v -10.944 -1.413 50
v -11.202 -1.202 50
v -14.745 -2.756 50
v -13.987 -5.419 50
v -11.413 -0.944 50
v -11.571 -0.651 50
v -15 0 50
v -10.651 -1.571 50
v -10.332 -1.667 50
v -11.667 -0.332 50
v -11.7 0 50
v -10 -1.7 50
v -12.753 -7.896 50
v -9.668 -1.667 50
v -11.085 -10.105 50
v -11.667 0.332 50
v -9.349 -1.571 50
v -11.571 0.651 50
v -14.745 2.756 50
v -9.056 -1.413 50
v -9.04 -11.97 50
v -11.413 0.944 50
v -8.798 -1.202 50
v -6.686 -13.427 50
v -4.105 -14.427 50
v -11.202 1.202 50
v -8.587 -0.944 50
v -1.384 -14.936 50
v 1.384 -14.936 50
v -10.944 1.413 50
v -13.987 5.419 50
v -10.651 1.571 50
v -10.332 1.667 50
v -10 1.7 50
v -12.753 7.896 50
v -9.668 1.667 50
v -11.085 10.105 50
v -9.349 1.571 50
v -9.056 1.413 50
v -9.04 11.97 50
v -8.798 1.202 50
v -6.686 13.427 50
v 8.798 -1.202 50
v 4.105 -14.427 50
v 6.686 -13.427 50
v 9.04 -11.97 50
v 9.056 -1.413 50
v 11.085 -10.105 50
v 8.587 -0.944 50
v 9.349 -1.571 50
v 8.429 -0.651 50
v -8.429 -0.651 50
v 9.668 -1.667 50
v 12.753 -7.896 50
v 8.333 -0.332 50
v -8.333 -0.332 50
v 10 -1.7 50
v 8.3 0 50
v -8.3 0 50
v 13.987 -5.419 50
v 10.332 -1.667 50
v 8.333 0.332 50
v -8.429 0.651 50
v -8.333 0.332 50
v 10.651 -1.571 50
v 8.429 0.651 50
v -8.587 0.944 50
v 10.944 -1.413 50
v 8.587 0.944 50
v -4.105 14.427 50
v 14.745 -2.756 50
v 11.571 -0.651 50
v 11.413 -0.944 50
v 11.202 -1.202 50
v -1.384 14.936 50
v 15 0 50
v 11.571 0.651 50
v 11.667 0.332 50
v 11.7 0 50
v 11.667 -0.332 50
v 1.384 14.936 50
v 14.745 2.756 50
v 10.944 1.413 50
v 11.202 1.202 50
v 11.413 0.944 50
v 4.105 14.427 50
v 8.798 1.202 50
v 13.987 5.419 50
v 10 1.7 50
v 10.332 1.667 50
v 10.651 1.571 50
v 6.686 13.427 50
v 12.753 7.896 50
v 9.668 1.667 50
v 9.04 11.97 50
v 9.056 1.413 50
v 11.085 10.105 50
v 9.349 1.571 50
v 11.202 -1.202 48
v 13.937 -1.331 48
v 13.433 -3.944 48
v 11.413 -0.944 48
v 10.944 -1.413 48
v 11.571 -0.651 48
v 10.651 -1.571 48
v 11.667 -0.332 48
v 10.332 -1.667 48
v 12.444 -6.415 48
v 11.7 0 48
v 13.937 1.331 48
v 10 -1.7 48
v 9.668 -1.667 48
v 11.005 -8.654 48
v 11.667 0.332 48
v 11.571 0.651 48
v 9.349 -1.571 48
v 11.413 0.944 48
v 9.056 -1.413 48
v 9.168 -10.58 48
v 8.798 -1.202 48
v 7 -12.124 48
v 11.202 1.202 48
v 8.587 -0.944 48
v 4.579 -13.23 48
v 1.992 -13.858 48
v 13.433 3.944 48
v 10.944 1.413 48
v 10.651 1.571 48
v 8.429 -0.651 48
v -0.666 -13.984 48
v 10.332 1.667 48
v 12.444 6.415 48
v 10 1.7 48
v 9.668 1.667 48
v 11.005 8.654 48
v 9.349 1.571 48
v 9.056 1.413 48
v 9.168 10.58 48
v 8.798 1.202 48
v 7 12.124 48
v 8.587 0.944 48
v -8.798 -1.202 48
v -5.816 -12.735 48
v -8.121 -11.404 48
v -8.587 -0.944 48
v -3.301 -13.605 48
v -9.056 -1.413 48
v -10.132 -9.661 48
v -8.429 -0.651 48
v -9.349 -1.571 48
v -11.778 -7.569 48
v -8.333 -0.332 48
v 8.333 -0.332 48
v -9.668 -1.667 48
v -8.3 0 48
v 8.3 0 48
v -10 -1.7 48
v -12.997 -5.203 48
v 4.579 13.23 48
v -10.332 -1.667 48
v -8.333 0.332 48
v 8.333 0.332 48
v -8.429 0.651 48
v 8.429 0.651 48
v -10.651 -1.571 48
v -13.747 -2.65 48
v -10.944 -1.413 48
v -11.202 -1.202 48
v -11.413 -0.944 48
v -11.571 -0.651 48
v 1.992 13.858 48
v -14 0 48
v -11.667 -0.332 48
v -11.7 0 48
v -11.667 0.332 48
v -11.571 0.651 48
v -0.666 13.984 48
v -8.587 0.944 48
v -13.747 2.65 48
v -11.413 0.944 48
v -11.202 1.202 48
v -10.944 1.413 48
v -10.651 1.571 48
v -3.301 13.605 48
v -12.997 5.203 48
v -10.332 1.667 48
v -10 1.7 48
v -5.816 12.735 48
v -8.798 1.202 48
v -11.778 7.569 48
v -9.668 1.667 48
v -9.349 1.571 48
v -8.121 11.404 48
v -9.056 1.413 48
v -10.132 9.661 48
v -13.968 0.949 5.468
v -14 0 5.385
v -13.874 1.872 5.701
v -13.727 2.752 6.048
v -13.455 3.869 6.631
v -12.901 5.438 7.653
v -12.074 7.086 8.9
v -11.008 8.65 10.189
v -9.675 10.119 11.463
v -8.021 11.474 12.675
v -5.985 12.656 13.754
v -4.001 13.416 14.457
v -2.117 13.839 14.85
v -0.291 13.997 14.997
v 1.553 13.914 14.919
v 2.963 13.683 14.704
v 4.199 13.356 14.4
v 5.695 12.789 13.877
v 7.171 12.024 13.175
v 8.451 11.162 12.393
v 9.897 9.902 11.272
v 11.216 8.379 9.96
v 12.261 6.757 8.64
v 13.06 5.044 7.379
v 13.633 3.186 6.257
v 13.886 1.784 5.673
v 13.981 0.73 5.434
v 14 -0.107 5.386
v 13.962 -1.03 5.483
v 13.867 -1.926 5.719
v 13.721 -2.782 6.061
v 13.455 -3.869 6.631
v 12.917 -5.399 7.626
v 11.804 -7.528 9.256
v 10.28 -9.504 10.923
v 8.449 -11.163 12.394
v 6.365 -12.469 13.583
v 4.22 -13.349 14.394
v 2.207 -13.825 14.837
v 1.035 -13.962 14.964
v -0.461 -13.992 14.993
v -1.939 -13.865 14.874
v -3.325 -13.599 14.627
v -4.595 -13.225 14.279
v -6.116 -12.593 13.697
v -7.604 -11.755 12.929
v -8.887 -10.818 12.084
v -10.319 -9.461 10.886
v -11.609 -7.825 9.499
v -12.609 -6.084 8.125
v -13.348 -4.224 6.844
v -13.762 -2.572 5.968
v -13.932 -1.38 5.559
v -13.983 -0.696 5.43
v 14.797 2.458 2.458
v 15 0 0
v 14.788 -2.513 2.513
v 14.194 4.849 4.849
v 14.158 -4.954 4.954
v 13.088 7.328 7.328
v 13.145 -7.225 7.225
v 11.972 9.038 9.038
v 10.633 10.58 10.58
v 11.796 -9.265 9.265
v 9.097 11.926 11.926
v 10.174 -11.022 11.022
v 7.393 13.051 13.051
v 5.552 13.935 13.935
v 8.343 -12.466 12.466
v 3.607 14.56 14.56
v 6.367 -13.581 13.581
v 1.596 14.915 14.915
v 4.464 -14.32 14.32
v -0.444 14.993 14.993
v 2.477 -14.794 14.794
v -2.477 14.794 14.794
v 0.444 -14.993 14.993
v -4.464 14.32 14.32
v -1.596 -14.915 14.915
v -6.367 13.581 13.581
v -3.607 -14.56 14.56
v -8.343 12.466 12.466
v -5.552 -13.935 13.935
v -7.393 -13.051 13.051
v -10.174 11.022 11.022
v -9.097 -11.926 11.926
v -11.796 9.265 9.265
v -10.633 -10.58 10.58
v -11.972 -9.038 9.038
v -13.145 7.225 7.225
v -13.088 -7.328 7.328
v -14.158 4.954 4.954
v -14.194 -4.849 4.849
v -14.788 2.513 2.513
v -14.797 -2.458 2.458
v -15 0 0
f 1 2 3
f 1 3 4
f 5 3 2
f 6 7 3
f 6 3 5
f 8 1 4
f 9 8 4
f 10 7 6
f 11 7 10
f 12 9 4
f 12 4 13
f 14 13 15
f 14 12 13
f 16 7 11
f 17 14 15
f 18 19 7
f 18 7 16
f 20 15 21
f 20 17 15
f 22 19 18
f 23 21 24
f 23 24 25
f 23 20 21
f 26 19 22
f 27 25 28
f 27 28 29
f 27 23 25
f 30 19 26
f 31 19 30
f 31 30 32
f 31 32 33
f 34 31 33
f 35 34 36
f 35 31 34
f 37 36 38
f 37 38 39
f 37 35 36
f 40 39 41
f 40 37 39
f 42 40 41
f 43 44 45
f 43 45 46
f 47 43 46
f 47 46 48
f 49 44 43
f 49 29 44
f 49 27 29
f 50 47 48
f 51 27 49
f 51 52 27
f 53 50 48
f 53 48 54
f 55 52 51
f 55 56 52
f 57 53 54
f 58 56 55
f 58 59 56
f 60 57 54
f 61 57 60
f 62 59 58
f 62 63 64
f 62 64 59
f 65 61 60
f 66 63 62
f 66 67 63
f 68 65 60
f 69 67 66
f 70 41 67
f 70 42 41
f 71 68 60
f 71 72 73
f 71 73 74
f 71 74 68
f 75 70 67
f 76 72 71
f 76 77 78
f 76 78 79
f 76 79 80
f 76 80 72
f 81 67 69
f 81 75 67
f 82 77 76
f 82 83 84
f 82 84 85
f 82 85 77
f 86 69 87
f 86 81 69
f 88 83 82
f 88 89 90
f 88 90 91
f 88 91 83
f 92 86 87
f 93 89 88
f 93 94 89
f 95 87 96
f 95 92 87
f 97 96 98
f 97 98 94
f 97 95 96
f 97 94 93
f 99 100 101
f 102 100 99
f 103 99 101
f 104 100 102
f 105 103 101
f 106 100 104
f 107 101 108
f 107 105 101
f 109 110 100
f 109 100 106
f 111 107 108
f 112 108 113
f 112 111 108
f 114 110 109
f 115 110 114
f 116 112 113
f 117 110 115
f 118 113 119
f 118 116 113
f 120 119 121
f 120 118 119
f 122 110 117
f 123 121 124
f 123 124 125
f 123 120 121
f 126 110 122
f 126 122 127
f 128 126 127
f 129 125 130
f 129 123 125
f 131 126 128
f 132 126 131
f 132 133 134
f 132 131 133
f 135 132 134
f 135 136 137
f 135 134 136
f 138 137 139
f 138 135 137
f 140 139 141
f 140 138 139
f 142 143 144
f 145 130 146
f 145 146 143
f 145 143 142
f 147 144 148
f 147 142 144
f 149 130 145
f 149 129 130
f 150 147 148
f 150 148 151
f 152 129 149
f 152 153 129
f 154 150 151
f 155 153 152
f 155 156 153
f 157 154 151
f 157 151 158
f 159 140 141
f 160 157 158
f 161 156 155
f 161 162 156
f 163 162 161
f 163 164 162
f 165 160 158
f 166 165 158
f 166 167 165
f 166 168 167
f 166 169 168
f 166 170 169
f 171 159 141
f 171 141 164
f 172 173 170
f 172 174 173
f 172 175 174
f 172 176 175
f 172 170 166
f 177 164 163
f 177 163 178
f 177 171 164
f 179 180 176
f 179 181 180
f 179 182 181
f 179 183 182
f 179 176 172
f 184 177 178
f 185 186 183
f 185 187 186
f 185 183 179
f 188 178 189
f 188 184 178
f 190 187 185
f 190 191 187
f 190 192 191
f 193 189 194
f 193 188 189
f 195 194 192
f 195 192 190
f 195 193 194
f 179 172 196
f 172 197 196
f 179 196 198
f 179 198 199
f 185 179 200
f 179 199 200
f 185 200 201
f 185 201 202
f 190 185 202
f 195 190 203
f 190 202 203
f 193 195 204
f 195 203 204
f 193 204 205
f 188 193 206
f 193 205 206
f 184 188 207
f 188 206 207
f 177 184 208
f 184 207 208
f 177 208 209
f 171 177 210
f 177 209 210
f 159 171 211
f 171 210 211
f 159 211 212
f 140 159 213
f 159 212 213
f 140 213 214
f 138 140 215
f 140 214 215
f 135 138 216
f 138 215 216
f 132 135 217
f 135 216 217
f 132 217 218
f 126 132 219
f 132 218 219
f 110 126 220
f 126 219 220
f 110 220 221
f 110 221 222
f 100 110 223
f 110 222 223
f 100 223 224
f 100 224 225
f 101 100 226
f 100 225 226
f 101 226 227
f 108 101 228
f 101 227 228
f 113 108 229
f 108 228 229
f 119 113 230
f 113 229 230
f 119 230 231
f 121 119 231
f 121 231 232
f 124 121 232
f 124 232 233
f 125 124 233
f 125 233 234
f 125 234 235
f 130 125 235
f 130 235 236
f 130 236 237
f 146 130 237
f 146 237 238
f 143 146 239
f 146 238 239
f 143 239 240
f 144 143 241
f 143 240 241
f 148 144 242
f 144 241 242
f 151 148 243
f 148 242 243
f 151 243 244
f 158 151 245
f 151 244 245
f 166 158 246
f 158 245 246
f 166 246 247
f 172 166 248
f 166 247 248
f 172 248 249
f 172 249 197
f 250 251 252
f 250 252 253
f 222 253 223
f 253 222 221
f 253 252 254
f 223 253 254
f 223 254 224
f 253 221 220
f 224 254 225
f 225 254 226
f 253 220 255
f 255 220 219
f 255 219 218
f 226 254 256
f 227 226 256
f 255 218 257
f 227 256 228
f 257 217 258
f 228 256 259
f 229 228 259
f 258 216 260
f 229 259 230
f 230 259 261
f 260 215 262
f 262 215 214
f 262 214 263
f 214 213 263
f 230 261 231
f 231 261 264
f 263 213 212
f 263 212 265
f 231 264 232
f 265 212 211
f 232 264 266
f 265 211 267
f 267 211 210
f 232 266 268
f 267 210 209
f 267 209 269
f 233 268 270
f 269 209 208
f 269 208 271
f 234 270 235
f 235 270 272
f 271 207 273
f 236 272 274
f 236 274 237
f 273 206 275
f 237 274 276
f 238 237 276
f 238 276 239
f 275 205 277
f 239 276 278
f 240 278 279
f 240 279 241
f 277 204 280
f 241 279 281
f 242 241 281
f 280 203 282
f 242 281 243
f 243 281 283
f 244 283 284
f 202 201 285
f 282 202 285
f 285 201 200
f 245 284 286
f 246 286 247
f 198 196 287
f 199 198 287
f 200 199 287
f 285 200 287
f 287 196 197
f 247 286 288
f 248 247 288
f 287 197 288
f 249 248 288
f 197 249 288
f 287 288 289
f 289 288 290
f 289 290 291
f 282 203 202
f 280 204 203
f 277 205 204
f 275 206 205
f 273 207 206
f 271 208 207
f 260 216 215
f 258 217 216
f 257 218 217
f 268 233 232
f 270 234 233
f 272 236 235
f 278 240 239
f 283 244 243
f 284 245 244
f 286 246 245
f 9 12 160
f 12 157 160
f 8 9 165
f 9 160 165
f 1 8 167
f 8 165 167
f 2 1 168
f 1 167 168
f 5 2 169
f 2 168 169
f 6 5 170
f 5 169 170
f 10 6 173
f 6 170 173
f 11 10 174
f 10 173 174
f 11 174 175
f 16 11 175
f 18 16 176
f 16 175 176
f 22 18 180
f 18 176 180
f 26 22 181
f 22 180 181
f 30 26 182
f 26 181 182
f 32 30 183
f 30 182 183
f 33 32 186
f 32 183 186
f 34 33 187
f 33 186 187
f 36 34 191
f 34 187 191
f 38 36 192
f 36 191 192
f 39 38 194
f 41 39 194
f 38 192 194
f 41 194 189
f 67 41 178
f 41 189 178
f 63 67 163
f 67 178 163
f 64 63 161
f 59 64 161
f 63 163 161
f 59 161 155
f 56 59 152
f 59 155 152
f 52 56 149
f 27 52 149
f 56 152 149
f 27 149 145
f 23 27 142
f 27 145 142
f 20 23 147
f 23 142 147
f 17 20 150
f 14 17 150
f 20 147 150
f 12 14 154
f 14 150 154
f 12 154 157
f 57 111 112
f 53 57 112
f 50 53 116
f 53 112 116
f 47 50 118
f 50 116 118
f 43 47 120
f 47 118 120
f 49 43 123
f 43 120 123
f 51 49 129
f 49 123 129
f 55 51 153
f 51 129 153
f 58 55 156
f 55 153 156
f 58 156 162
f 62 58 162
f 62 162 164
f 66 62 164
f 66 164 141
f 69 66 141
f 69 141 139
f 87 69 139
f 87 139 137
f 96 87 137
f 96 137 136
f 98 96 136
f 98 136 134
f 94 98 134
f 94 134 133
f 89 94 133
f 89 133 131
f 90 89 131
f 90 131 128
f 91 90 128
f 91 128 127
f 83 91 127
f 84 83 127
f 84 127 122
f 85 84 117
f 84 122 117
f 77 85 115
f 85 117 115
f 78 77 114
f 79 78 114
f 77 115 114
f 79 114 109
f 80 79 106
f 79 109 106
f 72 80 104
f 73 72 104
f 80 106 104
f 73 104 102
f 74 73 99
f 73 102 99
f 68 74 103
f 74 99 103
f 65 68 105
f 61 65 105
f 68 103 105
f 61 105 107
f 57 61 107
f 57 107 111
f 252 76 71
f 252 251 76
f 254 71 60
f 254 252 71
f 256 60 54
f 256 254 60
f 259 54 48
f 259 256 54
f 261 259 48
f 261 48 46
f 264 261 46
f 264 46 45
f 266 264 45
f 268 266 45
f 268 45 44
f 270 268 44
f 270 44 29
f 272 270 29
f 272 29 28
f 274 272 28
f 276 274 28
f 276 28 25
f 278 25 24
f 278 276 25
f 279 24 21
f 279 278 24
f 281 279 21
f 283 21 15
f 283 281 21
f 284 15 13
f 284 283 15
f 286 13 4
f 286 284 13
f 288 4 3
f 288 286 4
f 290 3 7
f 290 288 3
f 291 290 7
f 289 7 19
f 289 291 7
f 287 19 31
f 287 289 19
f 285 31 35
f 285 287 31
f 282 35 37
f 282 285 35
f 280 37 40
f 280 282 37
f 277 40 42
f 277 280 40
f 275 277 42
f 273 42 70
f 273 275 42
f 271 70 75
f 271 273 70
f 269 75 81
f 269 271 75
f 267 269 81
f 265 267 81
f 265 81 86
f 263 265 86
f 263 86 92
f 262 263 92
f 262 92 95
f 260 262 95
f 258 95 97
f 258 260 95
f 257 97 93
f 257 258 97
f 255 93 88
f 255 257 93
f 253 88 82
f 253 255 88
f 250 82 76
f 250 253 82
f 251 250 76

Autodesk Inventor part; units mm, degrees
ref_plane "YZ Plane" through (0, 0, 0) normal (1, 0, 0) x (0, 1, 0)
ref_plane "XZ Plane" through (0, 0, 0) normal (0, 1, 0) x (-1, 0, 0)
ref_plane "XY Plane" through (0, 0, 0) normal (0, 0, 1) x (1, 0, 0)
sketch "スケッチ1" plane through (0, 0, 0) normal (0, 0, 1) x (1, 0, 0)
  circle A0 centre (0, 0) radius 15
  dimension "d0" = 30
extrude "押し出し1" add sketch "スケッチ1" along normal blind 30
sketch "スケッチ2" plane through (0, 0, 30) normal (0, 0, 1) x (1, 0, 0)
  circle A0 centre (0, 0) radius 15
  dimension "d3" = 30
extrude "押し出し2" add sketch "スケッチ2" along normal blind 20
sketch "スケッチ4" plane through (0, 0, 0) normal (1, 0, 0) x (0, 1, 0)
  point P0 (0, 0)
sketch "スケッチ5" plane through (0, 0, 0) normal (0, 0, -1) x (-1, 0, 0)
  circle A0 centre (0, 0) radius 14
  dimension "d6" = 28
extrude "押し出し3" cut sketch "スケッチ5" against normal blind 48
sketch "スケッチ6" plane through (0, 0, 0) normal (0, 1, 0) x (-1, 0, 0)
  line L0 (15, 0) -> (-15, 0) projected
  arc A0 (15, 0) -> (-15, 0) centre (0, 0) ccw
extrude "押し出し4" cut sketch "スケッチ6" along normal blind 50 and the other way blind 25
sketch "スケッチ7" plane through (0, 0, 50) normal (0, 0, 1) x (1, 0, 0)
  point P0 (0, 0)
  point P1 (10, 0)
  point P2 (-10, 0)
  dimension "d14" = 10
  dimension "d15" = 10
hole "穴1" at (10, 0, 50) at (-10, 0, 50) direction (0, 0, -1) diameter 3.4 end through all clearance for "Flat Head Machine Screw" size "M3" standard "Ansi Metric M Profile"
properties part number "20220524_吸引部分筒"
